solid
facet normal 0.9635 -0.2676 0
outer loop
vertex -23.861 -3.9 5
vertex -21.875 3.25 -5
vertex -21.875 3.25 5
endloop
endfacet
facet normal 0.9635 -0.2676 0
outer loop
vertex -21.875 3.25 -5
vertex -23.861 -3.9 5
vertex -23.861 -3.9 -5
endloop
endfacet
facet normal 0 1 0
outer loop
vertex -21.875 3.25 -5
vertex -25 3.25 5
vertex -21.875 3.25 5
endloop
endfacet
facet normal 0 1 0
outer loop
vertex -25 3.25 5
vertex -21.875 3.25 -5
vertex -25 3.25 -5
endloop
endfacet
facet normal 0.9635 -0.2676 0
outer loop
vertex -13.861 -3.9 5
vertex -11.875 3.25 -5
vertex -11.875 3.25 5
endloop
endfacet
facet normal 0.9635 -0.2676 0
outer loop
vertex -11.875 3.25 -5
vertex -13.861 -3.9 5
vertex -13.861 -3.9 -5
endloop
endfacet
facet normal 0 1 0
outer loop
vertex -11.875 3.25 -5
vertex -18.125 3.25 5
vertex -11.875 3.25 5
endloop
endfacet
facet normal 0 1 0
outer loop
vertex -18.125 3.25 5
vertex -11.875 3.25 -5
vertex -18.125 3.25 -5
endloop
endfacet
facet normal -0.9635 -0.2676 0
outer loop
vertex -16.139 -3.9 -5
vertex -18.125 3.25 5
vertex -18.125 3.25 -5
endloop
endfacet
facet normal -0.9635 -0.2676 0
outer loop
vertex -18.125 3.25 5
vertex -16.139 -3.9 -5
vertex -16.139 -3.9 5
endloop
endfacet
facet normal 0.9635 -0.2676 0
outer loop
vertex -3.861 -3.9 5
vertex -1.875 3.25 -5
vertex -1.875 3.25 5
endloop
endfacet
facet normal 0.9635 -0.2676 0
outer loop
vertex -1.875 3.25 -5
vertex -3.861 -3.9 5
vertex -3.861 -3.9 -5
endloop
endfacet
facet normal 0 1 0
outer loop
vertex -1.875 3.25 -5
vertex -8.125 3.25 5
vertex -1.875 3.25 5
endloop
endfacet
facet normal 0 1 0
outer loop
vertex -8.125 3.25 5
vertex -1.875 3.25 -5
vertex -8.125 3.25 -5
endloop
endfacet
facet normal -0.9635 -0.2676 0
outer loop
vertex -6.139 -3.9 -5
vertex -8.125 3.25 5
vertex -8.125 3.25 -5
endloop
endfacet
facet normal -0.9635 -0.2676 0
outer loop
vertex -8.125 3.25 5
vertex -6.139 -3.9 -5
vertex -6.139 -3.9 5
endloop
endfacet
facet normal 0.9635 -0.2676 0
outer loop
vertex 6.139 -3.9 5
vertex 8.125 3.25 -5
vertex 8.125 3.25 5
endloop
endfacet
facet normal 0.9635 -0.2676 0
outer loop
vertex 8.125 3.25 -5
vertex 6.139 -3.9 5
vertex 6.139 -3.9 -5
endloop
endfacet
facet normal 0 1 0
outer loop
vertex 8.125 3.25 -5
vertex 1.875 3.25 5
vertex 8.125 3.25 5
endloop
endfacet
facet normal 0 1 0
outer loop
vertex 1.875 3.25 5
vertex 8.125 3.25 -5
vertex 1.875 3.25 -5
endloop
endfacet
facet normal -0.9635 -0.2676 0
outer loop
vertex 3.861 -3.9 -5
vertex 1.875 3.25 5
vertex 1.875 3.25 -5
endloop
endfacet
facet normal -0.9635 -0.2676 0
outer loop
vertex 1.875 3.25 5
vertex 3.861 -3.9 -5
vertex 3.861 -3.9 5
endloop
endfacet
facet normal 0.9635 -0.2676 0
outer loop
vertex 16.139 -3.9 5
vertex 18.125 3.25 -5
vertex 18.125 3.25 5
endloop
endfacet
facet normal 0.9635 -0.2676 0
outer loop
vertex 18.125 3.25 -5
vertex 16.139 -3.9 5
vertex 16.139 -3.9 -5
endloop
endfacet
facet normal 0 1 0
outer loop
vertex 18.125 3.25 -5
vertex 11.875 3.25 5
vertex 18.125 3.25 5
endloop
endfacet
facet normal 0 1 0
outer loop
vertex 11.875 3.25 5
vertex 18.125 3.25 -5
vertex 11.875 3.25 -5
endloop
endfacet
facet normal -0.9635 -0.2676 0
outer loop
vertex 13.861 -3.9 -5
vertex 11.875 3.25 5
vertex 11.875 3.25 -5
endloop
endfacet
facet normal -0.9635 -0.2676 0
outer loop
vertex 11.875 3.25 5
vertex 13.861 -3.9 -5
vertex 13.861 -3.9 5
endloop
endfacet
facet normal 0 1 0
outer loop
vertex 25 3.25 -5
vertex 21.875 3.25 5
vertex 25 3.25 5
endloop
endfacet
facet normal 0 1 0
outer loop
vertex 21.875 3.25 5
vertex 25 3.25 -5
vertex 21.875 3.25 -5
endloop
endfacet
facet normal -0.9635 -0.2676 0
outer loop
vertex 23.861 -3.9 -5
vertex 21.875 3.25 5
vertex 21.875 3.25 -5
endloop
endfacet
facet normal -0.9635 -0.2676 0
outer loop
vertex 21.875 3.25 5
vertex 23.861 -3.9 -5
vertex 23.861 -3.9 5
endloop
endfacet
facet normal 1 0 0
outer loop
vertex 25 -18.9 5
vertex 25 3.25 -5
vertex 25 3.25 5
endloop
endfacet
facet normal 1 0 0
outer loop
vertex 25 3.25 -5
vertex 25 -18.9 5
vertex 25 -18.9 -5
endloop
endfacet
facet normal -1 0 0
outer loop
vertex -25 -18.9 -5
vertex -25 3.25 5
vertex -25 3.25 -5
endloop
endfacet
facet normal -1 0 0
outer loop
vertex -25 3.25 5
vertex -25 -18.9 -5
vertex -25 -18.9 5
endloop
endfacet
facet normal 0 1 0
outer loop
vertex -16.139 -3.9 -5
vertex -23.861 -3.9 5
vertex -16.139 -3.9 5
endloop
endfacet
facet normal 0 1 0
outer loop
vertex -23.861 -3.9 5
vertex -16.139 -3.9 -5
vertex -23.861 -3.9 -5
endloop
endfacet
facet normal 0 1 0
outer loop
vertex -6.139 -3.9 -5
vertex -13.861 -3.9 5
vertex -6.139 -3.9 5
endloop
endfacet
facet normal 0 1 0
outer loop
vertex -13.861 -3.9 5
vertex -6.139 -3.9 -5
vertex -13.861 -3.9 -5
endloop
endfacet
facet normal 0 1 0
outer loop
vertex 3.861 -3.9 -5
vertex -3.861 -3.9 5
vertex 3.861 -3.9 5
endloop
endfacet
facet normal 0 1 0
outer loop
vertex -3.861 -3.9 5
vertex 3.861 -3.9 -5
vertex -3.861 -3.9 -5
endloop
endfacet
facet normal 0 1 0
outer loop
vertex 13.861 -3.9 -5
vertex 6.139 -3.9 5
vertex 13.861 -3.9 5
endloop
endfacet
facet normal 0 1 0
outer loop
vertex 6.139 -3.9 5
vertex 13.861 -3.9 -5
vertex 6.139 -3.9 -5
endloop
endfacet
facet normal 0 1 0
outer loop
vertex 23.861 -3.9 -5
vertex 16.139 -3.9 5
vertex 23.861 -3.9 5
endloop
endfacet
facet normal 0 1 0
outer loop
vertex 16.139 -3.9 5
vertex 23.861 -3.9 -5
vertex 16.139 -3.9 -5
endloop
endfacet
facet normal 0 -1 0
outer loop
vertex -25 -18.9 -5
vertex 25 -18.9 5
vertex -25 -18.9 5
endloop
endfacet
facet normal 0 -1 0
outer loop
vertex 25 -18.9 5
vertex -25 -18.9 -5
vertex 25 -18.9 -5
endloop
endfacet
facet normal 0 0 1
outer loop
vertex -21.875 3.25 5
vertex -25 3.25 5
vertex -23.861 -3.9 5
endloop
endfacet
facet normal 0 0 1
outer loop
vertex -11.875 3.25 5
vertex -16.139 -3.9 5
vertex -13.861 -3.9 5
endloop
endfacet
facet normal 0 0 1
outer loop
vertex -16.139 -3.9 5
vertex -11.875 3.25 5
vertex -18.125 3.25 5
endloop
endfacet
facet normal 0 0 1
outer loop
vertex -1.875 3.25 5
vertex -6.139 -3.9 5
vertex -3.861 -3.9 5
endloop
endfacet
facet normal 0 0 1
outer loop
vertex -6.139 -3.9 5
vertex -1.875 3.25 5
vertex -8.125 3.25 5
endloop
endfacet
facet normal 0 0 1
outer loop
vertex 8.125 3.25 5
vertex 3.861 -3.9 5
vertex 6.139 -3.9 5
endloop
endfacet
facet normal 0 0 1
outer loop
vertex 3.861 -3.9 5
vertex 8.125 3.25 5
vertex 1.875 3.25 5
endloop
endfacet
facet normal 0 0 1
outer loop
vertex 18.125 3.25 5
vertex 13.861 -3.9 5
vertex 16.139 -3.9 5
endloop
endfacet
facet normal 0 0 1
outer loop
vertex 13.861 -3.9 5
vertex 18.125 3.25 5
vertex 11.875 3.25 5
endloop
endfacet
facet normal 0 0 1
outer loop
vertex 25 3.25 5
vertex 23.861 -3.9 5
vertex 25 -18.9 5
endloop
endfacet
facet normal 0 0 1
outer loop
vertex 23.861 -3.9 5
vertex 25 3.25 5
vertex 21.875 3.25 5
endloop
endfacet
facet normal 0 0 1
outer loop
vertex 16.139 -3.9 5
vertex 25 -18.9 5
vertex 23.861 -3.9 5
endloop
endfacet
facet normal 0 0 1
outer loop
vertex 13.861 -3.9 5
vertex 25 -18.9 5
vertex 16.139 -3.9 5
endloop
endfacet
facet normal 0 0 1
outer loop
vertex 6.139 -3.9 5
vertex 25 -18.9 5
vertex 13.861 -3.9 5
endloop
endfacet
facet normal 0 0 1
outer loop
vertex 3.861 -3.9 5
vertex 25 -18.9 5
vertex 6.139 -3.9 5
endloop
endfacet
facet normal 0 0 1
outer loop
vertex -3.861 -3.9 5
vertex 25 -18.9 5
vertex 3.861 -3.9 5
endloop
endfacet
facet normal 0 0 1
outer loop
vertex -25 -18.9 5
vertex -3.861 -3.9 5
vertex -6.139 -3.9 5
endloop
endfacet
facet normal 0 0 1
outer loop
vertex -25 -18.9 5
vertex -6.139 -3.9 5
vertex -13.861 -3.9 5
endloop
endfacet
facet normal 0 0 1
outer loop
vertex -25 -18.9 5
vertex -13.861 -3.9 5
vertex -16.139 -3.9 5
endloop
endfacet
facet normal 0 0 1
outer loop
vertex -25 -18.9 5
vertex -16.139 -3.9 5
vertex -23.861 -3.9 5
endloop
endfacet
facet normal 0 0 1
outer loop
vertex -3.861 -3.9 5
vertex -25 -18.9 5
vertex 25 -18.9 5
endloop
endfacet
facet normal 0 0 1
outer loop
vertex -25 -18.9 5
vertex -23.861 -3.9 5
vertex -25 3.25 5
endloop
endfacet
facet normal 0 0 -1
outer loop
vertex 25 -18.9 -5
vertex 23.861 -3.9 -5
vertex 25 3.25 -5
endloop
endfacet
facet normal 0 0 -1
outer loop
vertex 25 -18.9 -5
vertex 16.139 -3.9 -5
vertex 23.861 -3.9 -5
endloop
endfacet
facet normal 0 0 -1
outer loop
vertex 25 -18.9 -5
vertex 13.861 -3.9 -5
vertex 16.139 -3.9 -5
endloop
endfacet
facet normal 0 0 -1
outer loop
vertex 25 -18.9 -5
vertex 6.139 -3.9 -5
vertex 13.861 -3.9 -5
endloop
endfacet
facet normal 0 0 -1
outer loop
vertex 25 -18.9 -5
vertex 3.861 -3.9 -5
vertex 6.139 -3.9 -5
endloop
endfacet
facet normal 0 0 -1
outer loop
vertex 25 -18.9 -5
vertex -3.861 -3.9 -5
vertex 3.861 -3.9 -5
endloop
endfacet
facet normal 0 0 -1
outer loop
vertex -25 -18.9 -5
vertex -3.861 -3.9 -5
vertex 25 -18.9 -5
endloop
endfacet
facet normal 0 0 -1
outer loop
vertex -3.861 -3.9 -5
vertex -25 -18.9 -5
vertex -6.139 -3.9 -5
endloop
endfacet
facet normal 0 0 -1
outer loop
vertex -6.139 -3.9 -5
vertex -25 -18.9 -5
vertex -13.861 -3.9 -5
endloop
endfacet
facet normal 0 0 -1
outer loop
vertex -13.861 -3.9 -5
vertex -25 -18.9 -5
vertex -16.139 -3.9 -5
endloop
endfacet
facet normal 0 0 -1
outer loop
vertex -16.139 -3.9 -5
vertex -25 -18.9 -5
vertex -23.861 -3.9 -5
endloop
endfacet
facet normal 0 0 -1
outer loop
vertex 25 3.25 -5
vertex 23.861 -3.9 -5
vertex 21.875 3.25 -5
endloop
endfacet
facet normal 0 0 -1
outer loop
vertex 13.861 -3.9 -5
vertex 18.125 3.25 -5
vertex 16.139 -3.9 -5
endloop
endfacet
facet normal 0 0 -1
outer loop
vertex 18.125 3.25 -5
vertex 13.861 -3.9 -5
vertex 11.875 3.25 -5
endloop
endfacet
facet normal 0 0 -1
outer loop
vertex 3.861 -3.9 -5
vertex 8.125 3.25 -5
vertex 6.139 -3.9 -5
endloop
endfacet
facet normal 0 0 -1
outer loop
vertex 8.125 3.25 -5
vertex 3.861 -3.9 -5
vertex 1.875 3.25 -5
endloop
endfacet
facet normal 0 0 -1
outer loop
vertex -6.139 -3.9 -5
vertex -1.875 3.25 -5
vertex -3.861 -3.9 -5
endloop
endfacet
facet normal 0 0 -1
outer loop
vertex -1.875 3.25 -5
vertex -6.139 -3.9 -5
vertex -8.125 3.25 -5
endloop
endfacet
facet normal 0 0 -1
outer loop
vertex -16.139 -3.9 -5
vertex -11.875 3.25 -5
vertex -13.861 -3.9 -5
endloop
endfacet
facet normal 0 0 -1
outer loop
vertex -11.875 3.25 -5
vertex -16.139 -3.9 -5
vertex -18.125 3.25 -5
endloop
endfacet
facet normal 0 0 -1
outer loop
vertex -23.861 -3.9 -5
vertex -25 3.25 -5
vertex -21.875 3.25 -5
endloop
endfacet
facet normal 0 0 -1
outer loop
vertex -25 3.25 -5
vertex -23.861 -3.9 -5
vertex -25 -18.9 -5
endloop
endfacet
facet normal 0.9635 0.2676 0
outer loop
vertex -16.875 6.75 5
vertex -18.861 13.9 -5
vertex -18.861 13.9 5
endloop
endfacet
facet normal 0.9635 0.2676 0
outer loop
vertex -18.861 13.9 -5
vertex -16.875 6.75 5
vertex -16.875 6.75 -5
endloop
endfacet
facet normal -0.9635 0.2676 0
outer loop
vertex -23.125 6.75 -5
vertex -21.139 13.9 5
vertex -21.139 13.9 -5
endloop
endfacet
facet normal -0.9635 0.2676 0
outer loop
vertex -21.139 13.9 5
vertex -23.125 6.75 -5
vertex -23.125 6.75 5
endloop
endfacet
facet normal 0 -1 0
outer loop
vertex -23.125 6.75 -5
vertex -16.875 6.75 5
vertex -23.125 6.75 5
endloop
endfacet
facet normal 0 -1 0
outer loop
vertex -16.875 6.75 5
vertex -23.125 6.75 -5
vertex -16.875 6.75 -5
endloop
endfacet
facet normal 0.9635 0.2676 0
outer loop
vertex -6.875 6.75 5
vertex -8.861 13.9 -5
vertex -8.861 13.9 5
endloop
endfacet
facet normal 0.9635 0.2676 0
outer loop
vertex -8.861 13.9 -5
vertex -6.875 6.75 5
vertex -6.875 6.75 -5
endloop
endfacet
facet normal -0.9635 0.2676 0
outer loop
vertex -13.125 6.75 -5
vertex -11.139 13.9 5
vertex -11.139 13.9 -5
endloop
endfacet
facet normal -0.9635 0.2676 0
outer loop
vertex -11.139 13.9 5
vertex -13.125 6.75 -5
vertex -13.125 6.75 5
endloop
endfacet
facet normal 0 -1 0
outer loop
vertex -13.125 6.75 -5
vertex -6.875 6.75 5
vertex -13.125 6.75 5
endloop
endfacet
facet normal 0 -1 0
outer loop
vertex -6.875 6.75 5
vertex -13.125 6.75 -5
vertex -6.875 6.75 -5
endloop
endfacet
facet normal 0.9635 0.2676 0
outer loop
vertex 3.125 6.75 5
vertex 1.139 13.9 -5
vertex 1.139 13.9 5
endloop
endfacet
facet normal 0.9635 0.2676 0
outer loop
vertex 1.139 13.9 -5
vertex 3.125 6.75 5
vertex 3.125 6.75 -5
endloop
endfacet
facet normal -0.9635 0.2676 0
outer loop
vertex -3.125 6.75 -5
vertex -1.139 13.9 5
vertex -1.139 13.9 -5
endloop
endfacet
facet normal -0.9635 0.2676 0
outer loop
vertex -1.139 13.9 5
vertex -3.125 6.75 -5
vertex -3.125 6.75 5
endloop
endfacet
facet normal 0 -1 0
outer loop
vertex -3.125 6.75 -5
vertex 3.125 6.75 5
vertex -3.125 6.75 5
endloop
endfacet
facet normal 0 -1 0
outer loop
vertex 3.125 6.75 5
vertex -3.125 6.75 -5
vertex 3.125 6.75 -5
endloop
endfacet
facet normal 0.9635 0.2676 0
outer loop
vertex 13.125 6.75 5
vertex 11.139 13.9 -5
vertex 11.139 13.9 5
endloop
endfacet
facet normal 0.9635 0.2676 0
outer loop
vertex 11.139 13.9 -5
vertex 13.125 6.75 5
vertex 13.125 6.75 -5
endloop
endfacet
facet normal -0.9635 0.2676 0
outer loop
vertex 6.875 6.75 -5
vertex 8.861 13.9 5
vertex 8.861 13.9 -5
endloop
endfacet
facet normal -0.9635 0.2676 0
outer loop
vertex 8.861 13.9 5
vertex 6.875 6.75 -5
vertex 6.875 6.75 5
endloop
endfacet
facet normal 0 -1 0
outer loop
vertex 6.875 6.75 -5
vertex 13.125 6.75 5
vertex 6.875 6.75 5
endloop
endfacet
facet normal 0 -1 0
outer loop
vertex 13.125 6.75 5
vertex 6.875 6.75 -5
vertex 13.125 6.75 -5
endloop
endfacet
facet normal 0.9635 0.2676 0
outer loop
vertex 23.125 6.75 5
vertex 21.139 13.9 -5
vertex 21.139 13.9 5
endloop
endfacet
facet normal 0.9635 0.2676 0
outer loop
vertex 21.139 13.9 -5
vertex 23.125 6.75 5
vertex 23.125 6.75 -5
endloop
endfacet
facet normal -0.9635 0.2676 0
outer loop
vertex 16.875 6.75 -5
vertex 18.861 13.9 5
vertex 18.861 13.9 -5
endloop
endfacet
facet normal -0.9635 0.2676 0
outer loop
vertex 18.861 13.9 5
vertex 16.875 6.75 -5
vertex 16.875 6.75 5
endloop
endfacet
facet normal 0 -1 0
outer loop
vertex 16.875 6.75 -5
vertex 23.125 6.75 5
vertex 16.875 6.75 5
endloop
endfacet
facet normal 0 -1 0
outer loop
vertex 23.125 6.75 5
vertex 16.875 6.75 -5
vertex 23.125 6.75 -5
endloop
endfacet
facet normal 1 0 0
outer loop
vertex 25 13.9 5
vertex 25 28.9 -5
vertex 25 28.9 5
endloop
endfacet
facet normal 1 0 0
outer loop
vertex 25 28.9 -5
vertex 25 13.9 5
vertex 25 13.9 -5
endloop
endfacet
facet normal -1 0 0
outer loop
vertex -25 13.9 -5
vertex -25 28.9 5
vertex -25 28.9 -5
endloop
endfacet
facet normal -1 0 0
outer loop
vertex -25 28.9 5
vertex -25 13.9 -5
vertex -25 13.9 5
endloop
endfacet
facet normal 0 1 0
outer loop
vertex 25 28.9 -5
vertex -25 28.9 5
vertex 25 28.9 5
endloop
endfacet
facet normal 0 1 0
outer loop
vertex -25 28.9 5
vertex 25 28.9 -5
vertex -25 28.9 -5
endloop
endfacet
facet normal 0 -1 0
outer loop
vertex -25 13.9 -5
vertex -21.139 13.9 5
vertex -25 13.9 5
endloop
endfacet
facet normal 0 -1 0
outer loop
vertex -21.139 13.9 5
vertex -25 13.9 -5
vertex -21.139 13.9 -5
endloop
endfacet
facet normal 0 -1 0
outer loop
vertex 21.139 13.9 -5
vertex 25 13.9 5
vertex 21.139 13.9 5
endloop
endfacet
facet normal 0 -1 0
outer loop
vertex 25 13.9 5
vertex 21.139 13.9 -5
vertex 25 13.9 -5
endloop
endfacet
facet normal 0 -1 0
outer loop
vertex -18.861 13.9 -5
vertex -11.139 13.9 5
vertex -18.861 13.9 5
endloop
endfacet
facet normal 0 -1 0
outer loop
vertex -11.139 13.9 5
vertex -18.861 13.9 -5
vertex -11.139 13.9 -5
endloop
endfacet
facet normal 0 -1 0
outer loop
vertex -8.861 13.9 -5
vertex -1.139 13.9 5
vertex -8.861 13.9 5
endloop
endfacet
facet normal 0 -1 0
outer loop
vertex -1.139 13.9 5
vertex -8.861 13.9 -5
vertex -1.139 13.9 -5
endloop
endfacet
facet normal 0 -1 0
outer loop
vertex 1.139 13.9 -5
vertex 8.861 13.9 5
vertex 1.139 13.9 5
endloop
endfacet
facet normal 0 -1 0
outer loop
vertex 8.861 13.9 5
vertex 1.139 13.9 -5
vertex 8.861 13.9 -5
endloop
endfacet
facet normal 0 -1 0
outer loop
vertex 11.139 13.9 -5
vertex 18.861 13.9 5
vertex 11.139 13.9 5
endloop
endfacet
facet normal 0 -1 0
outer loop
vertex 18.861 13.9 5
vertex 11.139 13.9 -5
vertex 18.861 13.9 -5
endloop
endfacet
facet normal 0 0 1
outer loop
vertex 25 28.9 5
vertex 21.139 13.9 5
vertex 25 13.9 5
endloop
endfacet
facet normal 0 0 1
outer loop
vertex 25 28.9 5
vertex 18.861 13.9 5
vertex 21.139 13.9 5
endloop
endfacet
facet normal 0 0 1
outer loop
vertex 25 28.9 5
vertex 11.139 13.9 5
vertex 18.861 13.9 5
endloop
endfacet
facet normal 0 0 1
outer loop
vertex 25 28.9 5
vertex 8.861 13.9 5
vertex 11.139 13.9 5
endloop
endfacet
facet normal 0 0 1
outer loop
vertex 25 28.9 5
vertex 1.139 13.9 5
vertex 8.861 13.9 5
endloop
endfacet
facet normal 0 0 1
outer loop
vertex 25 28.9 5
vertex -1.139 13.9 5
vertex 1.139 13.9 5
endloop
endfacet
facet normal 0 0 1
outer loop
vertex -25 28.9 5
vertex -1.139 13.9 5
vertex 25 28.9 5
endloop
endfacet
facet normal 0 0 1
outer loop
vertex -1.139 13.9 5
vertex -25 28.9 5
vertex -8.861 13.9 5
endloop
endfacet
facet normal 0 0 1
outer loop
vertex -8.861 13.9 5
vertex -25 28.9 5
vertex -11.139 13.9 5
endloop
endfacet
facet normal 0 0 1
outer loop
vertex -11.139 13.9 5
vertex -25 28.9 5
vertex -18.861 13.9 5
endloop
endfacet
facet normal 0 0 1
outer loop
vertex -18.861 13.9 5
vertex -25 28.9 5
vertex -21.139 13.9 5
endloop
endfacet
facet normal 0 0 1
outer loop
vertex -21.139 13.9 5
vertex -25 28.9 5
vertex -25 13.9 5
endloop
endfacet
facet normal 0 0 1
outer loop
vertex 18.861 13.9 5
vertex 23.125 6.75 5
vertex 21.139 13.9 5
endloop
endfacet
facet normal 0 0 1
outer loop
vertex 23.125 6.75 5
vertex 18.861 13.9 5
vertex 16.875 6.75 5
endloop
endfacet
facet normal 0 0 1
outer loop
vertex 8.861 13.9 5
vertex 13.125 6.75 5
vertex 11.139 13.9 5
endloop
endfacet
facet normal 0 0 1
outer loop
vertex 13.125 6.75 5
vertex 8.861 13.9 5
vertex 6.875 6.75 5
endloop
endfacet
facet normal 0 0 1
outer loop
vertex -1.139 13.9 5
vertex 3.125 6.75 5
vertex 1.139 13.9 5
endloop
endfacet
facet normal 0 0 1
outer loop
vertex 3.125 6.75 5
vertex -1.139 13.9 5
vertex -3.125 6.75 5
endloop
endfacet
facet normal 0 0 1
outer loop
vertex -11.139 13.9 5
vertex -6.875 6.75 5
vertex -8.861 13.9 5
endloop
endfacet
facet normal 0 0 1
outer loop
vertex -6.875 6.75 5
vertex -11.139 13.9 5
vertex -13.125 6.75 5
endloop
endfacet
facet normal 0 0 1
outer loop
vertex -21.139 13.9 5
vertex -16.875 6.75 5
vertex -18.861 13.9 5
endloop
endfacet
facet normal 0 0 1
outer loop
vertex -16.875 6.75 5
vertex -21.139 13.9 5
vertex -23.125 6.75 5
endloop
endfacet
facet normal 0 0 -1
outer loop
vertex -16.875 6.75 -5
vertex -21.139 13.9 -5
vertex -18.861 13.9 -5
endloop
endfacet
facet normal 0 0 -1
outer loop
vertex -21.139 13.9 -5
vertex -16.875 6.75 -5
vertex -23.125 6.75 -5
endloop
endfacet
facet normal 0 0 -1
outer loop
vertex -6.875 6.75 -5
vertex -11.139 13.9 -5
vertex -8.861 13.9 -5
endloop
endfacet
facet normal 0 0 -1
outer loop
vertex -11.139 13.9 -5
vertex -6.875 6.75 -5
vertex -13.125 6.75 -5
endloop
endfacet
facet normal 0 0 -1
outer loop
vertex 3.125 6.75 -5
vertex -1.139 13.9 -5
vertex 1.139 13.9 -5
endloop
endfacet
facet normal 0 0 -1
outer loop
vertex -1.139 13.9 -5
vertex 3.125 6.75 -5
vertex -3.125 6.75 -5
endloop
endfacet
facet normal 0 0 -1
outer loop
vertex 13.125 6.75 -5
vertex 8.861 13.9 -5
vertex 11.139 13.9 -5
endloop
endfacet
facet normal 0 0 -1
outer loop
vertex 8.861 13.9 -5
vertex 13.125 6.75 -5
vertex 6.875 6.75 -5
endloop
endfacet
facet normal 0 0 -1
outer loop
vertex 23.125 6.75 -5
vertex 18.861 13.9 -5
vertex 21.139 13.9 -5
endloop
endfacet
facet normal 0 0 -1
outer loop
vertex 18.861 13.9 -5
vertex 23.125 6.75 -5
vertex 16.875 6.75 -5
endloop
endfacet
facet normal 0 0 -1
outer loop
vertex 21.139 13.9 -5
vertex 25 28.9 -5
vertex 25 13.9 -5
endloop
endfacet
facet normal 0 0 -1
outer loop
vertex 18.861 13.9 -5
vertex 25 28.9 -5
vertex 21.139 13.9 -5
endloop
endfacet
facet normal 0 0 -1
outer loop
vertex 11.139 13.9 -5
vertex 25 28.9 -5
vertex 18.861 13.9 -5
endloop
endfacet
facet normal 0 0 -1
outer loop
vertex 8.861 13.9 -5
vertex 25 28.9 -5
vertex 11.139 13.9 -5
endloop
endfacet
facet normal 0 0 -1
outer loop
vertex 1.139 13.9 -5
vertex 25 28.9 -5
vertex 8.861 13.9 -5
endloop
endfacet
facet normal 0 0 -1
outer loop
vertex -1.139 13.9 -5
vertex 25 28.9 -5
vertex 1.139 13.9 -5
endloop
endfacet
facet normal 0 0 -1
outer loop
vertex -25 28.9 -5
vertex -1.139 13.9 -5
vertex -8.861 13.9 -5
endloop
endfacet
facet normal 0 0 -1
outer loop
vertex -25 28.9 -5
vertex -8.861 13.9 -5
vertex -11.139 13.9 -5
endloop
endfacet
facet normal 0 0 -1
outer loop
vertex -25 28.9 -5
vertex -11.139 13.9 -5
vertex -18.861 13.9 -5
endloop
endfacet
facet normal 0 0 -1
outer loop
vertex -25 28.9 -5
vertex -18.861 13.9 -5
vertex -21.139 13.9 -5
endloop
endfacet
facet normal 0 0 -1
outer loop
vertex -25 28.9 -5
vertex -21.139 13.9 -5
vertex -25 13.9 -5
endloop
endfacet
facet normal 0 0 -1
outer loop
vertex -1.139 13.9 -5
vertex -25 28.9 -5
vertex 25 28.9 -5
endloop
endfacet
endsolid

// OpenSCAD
// file: dovetail.scad
/**
 *  Dovetail parametric generator for OpenScad
 *  Générateur de queue d'aronde pour OpenScad
 *
 *  Copyright (c) 2012 Charles Rincheval.  All rights reserved.
 *
 *  This library is free software; you can redistribute it and/or
 *  modify it under the terms of the GNU Lesser General Public
 *  License as published by the Free Software Foundation; either
 *  version 2.1 of the License, or (at your option) any later version.
 *
 *  This library is distributed in the hope that it will be useful,
 *  but WITHOUT ANY WARRANTY; without even the implied warranty of
 *  MERCHANTABILITY or FITNESS FOR A PARTICULAR PURPOSE.  See the GNU
 *  Lesser General Public License for more details.
 *
 *  You should have received a copy of the GNU Lesser General Public
 *  License along with this library; if not, write to the Free Software
 *  Foundation, Inc., 51 Franklin St, Fifth Floor, Boston, MA  02110-1301  USA
 *
 *  Last update :
 *  https://github.com/hugokernel/OpenSCAD_Dovetail
 *
 *  http://www.digitalspirit.org/
 */

/**
 *  Create one teeth
 *  @param int width        Teeth width
 *  @param int height       Teeth height
 *  @param int thickness    Teeth thickness
 */
module dovetail_teeth(width, height, thickness) {
    offset = width / 3;
    translate([- width / 2, - height / 2, 0]) {
        linear_extrude(height = thickness) {
            polygon([[0, 0], [width, 0], [width - offset, height], [offset, height]]);
        }
    }
}


/**
 *  Dovetail
 *  @param int  width           Dovetail width
 *  @param int  teeth_count     Teeth count
 *  @param int  teeth_height    Teeth height
 *  @param int  teeth_thickness Teeth thickness
 *  @param int  clear           Teeth clear
 *  @param bool male            Get male (true) or female (false)
 */
module dovetail(width, teeth_count, teeth_height, teeth_thickness, clear=0.1, male=true, debug=false) {

    /**
     * 4 sections :
     *
     * |1/2         1/2|
     * |--+ <- 3 -> +--|--+         +--
     * |   \1  1  1/   |   \       /
     * |    \_____/    |    \_____/
     */

    y = ((width - teeth_count * 2 * clear) / teeth_count) / 4;

    compensation = - 0.1;
    teeth_width = y * 3;

    // Always width / 3 (ref. dovetail_teeth())
    offset = teeth_width / 3;
    start_at = clear * 2 + teeth_width / 2 - width / 2 - clear;

    translate([0, 0, - teeth_thickness / 2]) {

        // Debug purpose only
        if (debug) {
            translate([- width / 2, 0, - width / 2]) {
                %cube(size = [width, 0.01, width]);
            }
        }

        for (i = [-1 : teeth_count * 2 - 1] ) {
            x = start_at + y / 2 + (teeth_width - offset + clear) * i;
            if (i % 2) {
                x = x + 0.1;
                translate([x + compensation, - clear, 0]) {
                    rotate([0, 0, 180]) {
                        if (male == true) {
                            dovetail_teeth(teeth_width - clear, teeth_height - clear, teeth_thickness);
                        }
                    }
                }
            } else {
                translate([x, clear, 0]) {
                    if (male == false) {
                        dovetail_teeth(teeth_width - clear, teeth_height - clear, teeth_thickness);
                    }
                }
            }
        }
    }
}

/**
 *  Cut piece
 *  @param vector position  Cut position ([x, y, z])
 *  @param vector dimension Dimension of bounding box ([w, l, h])
 *  @param vector teeths    Teeths parameters ([count, height, clearance])
 *  @param bool   male      Get male (true) or female (false)
 */
module cutter(position, dimension, teeths, male=true, debug=false) {
    translate(position) {
        dovetail(dimension[0], teeths[0], teeths[1], dimension[2], teeths[2], male, debug);

        if (male) {
            translate([- dimension[0] / 2, - (teeths[1] / 2 - 0.1) - dimension[1], - dimension[2] / 2]) {
                cube(size = dimension);
            }
        } else {
            translate([- dimension[0] / 2, teeths[1] / 2 - 0.1, - dimension[2] / 2]) {
                cube(size = dimension);
            }
        }
    }
}
// main file
use <dovetail.scad>;

// Your amazing design you want to cut
module amazing_design() {
    cube(size=[50, 50, 10], center=true);
}

// First, setup the cutting position: middle cut
position = [0, 0, 0];

// Next, setup the dimension of the cut: use the bounding box of your design
dimension = [50, 15, 100];

// Finally, setup the dovetail:
// - Teeth count
// - Teeth height
// - Teeth Clearance
teeth = [5, 8, 0.5];

// Now, cut !

// Extract the first part...
intersection() {
    amazing_design();
    #cutter(position=[0, 0, 0], dimension=dimension, teeths=teeth, male=true);
}


// ... and the second part
translate([0,10,0])
intersection() {
    amazing_design();
    cutter(position=[0, 0, 0], dimension=dimension, teeths=teeth, male=false);
}
